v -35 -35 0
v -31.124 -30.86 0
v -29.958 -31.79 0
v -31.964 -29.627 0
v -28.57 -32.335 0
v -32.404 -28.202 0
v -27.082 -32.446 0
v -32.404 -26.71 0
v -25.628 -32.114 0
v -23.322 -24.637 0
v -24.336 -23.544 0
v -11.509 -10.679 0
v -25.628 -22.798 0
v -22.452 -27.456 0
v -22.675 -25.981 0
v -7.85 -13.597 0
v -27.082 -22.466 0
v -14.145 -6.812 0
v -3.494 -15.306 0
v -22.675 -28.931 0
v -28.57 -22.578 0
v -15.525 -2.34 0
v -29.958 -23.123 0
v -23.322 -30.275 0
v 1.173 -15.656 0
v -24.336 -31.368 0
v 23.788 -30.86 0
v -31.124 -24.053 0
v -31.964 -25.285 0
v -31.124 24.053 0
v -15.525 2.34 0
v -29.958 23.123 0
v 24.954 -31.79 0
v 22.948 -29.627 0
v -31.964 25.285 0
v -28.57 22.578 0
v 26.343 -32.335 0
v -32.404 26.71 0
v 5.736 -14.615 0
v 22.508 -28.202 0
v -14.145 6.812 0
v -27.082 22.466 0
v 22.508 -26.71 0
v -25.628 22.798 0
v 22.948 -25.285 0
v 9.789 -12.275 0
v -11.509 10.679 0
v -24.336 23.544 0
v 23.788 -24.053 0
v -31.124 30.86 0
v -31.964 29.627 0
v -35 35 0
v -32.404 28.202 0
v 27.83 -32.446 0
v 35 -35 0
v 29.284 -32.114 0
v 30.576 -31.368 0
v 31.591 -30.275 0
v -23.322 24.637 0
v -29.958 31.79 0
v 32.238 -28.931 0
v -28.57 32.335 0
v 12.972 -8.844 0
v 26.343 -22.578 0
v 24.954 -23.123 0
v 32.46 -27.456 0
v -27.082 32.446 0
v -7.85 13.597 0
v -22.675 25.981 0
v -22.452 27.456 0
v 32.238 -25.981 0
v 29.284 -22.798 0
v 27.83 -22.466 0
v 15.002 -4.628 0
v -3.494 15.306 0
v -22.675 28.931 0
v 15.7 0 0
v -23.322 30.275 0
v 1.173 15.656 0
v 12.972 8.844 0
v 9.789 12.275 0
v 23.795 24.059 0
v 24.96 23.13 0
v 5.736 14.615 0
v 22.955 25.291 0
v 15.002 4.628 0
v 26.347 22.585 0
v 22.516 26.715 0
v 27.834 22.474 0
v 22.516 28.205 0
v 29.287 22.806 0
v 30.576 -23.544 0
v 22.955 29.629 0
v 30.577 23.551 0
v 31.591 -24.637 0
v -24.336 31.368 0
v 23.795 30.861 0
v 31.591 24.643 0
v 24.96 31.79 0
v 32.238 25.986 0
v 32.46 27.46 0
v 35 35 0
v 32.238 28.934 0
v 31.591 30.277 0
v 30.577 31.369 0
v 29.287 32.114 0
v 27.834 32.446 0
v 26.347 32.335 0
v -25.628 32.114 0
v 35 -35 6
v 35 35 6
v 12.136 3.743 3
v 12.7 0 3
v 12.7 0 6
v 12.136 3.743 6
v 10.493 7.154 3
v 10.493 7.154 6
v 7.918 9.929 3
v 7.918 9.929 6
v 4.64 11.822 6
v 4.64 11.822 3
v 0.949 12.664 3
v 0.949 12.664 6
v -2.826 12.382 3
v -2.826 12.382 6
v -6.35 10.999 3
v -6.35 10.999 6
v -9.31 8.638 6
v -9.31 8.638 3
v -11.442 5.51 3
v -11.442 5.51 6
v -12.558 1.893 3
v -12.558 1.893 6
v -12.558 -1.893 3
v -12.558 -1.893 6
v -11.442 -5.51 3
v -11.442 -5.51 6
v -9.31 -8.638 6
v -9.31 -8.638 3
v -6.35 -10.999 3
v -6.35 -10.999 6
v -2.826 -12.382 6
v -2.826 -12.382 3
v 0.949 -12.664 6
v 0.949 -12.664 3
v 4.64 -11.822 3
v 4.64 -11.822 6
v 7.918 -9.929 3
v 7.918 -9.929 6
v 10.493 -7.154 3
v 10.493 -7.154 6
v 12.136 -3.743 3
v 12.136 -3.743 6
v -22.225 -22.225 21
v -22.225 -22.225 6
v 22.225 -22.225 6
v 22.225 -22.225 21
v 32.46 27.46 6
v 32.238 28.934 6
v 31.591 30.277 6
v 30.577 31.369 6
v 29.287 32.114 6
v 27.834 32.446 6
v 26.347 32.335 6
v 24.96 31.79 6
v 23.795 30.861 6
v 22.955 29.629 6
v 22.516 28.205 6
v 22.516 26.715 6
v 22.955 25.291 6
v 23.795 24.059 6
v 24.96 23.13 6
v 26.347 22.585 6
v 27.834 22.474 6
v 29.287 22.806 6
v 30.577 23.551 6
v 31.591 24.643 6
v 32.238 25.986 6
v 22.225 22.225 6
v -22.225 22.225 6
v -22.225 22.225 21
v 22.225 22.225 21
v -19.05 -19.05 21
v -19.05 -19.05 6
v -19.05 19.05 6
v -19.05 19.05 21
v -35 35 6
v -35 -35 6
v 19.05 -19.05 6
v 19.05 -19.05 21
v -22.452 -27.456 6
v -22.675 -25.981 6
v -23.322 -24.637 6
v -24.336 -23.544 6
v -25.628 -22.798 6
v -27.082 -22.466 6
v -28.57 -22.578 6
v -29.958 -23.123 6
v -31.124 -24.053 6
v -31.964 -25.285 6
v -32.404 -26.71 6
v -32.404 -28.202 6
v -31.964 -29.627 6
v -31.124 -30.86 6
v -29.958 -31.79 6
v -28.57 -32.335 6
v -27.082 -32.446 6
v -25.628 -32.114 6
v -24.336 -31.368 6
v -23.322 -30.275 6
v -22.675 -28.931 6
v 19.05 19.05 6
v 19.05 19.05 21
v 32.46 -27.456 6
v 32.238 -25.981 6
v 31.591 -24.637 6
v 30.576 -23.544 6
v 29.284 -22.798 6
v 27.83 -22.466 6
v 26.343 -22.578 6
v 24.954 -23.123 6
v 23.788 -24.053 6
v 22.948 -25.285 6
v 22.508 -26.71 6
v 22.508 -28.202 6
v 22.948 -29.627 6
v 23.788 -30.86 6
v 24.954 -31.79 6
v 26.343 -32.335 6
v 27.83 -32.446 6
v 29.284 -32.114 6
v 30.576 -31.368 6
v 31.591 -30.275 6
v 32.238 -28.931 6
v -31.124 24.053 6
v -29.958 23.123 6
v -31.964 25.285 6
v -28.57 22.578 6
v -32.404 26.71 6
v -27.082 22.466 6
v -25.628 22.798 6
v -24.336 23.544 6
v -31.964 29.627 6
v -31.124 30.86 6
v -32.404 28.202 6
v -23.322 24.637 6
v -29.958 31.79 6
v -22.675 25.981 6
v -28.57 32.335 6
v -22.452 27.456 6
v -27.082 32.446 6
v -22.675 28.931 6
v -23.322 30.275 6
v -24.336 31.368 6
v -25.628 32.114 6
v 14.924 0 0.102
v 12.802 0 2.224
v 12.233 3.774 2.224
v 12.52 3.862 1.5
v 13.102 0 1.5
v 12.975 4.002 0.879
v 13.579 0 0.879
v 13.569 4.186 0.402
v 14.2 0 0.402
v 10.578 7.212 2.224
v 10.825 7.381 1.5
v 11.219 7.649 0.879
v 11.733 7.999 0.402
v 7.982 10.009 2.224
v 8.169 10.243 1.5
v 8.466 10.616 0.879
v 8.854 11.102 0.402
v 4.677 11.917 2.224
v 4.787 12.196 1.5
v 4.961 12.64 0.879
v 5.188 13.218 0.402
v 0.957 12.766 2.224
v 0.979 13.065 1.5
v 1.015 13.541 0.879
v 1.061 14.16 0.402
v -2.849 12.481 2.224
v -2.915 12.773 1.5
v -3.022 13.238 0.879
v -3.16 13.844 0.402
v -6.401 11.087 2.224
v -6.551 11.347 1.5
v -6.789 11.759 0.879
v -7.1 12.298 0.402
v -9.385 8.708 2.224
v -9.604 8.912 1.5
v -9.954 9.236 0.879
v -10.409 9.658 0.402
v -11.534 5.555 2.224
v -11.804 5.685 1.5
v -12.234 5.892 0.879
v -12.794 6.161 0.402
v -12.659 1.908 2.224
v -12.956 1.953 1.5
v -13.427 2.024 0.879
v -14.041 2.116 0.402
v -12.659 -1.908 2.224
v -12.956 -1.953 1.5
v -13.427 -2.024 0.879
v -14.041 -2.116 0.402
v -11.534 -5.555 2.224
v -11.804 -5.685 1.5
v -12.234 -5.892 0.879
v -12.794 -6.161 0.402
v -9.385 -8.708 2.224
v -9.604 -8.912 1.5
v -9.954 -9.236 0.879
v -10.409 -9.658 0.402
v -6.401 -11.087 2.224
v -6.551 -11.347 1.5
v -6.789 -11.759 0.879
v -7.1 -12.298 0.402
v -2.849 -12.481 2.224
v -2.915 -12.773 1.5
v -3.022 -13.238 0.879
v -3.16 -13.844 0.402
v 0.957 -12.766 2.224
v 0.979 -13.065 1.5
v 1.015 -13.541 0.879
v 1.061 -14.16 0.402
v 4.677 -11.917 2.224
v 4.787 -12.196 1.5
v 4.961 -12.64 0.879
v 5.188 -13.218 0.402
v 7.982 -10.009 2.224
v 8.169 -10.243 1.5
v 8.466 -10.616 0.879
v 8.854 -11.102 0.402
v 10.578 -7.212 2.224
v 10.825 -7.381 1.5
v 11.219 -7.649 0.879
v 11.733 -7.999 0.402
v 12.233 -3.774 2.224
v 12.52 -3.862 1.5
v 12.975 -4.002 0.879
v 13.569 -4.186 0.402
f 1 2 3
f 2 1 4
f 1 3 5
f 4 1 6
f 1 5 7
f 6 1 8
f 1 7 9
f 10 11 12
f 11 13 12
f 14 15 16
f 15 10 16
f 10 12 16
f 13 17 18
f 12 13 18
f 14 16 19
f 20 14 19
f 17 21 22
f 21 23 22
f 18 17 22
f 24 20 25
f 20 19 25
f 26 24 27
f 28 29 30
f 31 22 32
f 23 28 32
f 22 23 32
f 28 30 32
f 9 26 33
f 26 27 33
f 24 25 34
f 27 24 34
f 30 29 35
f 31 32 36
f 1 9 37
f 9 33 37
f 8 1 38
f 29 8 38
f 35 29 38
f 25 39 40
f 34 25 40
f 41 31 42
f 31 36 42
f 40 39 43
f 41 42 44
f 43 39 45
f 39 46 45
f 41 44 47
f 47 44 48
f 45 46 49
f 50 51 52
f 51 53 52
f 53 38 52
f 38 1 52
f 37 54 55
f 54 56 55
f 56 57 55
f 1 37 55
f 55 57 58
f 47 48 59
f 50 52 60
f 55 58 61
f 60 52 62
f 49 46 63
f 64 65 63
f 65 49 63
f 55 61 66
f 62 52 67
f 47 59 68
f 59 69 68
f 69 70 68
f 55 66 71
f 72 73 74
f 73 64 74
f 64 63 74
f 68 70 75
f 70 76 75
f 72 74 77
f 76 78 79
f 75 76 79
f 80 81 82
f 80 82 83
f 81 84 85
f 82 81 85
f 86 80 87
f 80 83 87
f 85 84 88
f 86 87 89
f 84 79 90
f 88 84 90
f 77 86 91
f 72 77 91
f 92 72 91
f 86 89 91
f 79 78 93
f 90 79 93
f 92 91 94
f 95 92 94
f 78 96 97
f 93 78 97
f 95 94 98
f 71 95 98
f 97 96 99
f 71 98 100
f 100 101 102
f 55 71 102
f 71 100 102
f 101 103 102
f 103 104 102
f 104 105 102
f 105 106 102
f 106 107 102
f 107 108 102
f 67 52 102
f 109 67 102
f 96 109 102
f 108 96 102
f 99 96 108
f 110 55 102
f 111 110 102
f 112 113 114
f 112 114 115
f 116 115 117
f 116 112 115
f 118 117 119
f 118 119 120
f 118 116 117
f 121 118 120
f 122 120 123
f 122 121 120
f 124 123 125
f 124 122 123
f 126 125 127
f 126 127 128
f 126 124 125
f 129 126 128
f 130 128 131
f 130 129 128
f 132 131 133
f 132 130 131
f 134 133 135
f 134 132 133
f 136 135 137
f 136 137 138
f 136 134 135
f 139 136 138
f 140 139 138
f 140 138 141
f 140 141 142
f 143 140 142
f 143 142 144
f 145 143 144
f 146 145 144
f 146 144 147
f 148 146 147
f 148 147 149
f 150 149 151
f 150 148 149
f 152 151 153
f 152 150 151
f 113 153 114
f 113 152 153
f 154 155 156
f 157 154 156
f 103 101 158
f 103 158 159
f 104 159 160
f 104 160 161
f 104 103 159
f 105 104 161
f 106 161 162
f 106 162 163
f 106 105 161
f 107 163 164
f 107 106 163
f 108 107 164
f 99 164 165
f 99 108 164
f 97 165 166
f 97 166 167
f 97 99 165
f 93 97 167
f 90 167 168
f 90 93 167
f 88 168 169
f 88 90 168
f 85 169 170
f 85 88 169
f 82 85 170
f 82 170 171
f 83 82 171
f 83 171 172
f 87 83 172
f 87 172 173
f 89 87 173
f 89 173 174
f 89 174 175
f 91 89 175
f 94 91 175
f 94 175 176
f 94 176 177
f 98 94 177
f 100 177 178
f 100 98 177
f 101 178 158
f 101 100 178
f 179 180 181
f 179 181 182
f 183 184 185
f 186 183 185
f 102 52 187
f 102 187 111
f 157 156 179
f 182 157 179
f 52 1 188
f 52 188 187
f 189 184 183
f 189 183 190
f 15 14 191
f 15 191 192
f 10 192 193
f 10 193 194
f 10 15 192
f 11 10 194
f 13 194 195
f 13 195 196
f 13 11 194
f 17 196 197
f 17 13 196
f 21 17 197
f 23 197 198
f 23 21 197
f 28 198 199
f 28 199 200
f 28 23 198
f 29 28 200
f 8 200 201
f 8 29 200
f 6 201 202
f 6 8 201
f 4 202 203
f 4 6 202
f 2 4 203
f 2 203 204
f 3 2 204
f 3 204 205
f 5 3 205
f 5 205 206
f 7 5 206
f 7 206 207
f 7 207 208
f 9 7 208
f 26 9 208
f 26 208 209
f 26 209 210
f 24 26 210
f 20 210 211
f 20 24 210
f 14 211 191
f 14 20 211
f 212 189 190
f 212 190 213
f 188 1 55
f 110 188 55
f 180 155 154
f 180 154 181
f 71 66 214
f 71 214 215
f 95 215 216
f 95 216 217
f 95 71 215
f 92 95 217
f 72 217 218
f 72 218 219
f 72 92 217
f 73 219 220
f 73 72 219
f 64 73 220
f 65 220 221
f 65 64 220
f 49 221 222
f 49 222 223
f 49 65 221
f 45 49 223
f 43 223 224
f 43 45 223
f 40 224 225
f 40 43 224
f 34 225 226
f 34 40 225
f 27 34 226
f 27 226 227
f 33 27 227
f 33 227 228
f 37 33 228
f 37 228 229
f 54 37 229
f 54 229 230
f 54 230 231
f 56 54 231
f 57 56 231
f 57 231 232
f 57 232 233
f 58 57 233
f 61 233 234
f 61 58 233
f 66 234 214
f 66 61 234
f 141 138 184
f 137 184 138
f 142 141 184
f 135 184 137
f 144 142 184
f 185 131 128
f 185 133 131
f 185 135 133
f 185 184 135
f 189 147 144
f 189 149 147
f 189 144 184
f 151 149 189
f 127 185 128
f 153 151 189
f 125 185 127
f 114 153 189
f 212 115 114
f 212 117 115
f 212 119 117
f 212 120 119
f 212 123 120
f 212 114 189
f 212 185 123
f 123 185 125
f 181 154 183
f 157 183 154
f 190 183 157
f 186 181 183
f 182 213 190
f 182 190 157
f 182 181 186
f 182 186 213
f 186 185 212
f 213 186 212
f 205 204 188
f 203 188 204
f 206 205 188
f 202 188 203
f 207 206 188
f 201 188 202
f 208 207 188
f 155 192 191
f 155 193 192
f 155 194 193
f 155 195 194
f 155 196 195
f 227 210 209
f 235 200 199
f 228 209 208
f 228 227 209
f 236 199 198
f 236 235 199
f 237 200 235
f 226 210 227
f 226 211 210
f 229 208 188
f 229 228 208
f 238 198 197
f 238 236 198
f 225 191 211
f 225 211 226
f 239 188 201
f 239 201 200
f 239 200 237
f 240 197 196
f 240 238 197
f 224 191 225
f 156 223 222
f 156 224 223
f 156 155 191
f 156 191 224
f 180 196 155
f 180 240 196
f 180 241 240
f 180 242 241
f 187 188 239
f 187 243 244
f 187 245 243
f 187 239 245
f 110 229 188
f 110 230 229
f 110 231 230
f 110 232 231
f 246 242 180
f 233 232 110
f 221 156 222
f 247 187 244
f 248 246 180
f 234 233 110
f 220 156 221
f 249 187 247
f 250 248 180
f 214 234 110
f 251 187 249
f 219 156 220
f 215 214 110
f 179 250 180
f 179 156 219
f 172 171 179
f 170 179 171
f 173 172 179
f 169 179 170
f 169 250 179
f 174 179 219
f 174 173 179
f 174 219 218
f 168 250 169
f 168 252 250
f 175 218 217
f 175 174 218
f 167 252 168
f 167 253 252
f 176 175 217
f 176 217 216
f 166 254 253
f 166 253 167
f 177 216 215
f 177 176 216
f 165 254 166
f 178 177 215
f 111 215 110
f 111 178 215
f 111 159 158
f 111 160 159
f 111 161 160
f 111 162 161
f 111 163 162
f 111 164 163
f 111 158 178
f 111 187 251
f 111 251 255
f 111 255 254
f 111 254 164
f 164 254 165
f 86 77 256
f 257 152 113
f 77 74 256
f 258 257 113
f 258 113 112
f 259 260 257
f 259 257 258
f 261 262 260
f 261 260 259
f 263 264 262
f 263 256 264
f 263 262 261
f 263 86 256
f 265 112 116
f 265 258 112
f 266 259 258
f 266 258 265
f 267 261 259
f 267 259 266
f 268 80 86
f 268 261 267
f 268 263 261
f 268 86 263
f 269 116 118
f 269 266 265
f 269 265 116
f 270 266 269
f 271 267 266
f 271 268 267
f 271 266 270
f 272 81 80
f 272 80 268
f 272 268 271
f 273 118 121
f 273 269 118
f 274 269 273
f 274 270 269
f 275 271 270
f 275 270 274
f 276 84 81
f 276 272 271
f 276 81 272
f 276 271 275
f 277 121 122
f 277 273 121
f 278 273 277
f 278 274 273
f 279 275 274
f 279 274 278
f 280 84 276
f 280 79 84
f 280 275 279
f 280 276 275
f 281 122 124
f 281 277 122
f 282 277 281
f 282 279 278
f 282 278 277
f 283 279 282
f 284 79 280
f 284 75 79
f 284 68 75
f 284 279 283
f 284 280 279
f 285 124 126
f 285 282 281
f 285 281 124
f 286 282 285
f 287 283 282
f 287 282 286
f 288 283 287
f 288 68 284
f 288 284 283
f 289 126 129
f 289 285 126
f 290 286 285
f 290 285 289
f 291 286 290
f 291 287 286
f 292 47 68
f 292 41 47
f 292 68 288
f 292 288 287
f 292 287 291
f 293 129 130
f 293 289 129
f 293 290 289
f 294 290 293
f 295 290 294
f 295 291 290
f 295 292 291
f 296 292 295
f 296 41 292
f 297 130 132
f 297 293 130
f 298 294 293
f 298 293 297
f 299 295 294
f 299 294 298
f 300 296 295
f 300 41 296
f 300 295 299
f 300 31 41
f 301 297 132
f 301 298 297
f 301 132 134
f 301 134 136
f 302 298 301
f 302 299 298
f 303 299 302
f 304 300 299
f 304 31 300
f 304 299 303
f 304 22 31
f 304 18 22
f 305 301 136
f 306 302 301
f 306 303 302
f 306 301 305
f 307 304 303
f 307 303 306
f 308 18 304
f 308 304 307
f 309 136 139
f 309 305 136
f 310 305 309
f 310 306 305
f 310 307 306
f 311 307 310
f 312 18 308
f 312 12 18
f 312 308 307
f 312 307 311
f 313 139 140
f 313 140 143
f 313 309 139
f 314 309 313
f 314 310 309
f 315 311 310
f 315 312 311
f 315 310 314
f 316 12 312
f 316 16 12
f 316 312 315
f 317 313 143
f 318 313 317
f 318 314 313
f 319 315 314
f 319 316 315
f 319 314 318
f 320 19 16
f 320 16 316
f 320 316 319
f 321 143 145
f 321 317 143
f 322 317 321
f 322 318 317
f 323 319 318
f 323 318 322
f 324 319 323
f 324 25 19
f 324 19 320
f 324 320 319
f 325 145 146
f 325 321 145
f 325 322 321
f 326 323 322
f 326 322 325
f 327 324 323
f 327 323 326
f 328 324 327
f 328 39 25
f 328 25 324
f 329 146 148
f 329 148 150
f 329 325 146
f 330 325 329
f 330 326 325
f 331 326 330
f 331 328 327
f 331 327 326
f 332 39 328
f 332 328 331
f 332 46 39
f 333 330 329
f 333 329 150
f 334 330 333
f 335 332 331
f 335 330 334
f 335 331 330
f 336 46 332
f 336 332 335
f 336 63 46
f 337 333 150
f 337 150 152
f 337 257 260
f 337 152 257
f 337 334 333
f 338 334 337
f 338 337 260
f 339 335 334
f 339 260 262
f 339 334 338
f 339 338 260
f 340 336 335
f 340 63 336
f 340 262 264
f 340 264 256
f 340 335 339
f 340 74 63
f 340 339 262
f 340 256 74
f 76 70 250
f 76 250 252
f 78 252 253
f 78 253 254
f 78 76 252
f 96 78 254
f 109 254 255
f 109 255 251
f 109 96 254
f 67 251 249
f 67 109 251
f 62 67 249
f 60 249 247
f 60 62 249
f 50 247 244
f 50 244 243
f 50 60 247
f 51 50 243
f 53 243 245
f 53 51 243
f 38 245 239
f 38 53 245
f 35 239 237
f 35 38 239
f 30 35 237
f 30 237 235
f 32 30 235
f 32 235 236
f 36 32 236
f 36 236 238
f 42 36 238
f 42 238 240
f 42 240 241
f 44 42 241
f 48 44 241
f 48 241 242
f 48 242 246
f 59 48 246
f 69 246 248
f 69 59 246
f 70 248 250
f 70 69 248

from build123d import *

# Parameters (mm, degrees)
F0_W     = 70
F0_H     = 70
F0_R     = 5.0038
F0_R_2   = 12.7
F0_R_3   = 5
F1_DEPTH = 6
F2_R     = 3
F3_W     = 44.45
F3_H     = 44.45
F3_W_2   = 38.1
F3_H_2   = 38.1
F4_DEPTH = 15


with BuildPart() as f1:
    # F0 (on Top) → F1 (new body)
    with BuildSketch(Plane.XY):
        Rectangle(F0_W, F0_H)
        with Locations((-27.4562, -27.4562)):
            Circle(F0_R, mode=Mode.SUBTRACT)
        with Locations((27.4562, -27.4562)):
            Circle(F0_R, mode=Mode.SUBTRACT)
        with Locations((-27.4562, 27.4562)):
            Circle(F0_R, mode=Mode.SUBTRACT)
        Circle(F0_R_2, mode=Mode.SUBTRACT)
        with Locations((27.46, 27.46)):
            Circle(F0_R_3, mode=Mode.SUBTRACT)
    extrude(amount=F1_DEPTH)

    # F2
    f2_edges = [f1.edges().sort_by_distance(p)[0] for p in [
        (-12.7, 0, 0),
    ]]
    fillet(f2_edges, radius=F2_R)

    # F3 (on face) → F4 (join)
    with BuildSketch(Plane.XY.offset(6)):
        Rectangle(F3_W, F3_H)
        Rectangle(F3_W_2, F3_H_2, mode=Mode.SUBTRACT)
    extrude(amount=F4_DEPTH)


solid = f1.part
